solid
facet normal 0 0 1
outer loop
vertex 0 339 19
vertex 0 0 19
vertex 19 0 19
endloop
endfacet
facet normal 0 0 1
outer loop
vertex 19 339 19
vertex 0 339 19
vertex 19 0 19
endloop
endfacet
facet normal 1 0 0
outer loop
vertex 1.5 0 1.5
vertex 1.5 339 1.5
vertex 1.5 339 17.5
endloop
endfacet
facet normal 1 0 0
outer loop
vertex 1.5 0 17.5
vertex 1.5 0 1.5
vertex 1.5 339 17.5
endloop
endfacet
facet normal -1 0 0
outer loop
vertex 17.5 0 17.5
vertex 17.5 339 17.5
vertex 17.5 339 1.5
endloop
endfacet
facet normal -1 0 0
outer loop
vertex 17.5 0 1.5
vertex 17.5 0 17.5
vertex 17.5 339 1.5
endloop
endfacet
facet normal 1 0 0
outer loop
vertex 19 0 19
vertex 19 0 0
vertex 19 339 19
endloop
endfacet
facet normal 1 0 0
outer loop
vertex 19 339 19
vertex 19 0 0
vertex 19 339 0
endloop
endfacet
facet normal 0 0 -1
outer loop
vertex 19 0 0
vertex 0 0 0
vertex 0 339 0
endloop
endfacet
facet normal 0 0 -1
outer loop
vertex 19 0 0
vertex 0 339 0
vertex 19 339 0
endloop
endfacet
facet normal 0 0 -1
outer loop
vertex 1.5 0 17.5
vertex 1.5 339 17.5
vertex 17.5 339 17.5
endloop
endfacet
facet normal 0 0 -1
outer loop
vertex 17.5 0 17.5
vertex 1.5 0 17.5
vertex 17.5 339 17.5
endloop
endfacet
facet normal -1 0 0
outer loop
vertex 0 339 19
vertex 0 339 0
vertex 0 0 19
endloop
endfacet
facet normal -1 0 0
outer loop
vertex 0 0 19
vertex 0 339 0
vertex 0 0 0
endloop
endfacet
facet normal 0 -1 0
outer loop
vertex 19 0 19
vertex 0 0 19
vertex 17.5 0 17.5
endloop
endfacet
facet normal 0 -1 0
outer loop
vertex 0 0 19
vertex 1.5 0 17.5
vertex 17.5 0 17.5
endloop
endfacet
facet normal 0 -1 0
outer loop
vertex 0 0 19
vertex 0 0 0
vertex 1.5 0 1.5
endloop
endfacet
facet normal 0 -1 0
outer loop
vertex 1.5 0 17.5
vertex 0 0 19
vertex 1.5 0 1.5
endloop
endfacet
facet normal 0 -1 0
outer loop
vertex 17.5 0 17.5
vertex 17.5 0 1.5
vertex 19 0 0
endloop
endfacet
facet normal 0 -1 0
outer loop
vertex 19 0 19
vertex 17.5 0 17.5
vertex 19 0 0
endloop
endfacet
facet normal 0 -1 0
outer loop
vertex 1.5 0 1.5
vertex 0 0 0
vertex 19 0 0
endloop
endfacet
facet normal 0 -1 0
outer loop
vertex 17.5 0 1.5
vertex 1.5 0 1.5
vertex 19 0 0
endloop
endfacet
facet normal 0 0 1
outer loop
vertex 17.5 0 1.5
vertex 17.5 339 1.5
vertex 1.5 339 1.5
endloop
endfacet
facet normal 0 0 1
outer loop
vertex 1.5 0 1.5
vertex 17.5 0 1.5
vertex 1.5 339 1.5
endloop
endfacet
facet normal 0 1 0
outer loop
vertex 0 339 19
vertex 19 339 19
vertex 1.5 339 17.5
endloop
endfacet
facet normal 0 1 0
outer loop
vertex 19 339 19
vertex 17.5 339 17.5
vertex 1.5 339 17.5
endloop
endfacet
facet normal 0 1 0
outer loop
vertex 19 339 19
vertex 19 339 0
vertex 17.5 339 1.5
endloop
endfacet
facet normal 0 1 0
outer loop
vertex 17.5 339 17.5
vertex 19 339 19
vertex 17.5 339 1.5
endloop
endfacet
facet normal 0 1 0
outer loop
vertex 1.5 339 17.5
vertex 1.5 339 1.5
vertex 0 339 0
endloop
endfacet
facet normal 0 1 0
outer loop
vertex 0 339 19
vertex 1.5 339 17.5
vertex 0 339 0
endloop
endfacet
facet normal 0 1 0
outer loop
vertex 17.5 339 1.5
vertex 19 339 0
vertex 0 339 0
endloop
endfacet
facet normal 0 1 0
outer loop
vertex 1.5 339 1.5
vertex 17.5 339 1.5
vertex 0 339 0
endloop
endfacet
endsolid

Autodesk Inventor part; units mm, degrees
ref_plane "YZ Plane" through (0, 0, 0) normal (1, 0, 0) x (0, 1, 0)
ref_plane "XZ Plane" through (0, 0, 0) normal (0, 1, 0) x (-1, 0, 0)
ref_plane "XY Plane" through (0, 0, 0) normal (0, 0, 1) x (1, 0, 0)
sketch "Sketch1" plane through (0, 0, 0) normal (0, 0, 1) x (1, 0, 0)
  line L0 (0, 0) -> (19, 0)
  line L1 (19, 0) -> (19, 339)
  line L2 (19, 339) -> (0, 339)
  line L3 (0, 339) -> (0, 0)
  dimension "d0" = 19
  dimension "d1" = 339
extrude "Extrusion1" add sketch "Sketch1" along normal blind 19
sketch "Sketch2" plane through (0, 0, 0) normal (0, -1, 0) x (1, 0, 0)
  line L0 (0, 0) -> (19, 0) projected
  line L1 (19, 0) -> (19, 19) projected
  line L2 (0, 19) -> (19, 19) projected
  line L3 (0, 0) -> (0, 19) projected
  line L4 (17.5, 17.5) -> (17.5, 1.5)
  line L5 (17.5, 1.5) -> (1.5, 1.5)
  line L6 (1.5, 1.5) -> (1.5, 17.5)
  line L7 (1.5, 17.5) -> (17.5, 17.5)
  dimension "d4" = 1.5
extrude "Extrusion2" cut sketch "Sketch2" against normal through all contours L4 L5 L6 L7
properties part number "C008" material "Aluminum 6061"
